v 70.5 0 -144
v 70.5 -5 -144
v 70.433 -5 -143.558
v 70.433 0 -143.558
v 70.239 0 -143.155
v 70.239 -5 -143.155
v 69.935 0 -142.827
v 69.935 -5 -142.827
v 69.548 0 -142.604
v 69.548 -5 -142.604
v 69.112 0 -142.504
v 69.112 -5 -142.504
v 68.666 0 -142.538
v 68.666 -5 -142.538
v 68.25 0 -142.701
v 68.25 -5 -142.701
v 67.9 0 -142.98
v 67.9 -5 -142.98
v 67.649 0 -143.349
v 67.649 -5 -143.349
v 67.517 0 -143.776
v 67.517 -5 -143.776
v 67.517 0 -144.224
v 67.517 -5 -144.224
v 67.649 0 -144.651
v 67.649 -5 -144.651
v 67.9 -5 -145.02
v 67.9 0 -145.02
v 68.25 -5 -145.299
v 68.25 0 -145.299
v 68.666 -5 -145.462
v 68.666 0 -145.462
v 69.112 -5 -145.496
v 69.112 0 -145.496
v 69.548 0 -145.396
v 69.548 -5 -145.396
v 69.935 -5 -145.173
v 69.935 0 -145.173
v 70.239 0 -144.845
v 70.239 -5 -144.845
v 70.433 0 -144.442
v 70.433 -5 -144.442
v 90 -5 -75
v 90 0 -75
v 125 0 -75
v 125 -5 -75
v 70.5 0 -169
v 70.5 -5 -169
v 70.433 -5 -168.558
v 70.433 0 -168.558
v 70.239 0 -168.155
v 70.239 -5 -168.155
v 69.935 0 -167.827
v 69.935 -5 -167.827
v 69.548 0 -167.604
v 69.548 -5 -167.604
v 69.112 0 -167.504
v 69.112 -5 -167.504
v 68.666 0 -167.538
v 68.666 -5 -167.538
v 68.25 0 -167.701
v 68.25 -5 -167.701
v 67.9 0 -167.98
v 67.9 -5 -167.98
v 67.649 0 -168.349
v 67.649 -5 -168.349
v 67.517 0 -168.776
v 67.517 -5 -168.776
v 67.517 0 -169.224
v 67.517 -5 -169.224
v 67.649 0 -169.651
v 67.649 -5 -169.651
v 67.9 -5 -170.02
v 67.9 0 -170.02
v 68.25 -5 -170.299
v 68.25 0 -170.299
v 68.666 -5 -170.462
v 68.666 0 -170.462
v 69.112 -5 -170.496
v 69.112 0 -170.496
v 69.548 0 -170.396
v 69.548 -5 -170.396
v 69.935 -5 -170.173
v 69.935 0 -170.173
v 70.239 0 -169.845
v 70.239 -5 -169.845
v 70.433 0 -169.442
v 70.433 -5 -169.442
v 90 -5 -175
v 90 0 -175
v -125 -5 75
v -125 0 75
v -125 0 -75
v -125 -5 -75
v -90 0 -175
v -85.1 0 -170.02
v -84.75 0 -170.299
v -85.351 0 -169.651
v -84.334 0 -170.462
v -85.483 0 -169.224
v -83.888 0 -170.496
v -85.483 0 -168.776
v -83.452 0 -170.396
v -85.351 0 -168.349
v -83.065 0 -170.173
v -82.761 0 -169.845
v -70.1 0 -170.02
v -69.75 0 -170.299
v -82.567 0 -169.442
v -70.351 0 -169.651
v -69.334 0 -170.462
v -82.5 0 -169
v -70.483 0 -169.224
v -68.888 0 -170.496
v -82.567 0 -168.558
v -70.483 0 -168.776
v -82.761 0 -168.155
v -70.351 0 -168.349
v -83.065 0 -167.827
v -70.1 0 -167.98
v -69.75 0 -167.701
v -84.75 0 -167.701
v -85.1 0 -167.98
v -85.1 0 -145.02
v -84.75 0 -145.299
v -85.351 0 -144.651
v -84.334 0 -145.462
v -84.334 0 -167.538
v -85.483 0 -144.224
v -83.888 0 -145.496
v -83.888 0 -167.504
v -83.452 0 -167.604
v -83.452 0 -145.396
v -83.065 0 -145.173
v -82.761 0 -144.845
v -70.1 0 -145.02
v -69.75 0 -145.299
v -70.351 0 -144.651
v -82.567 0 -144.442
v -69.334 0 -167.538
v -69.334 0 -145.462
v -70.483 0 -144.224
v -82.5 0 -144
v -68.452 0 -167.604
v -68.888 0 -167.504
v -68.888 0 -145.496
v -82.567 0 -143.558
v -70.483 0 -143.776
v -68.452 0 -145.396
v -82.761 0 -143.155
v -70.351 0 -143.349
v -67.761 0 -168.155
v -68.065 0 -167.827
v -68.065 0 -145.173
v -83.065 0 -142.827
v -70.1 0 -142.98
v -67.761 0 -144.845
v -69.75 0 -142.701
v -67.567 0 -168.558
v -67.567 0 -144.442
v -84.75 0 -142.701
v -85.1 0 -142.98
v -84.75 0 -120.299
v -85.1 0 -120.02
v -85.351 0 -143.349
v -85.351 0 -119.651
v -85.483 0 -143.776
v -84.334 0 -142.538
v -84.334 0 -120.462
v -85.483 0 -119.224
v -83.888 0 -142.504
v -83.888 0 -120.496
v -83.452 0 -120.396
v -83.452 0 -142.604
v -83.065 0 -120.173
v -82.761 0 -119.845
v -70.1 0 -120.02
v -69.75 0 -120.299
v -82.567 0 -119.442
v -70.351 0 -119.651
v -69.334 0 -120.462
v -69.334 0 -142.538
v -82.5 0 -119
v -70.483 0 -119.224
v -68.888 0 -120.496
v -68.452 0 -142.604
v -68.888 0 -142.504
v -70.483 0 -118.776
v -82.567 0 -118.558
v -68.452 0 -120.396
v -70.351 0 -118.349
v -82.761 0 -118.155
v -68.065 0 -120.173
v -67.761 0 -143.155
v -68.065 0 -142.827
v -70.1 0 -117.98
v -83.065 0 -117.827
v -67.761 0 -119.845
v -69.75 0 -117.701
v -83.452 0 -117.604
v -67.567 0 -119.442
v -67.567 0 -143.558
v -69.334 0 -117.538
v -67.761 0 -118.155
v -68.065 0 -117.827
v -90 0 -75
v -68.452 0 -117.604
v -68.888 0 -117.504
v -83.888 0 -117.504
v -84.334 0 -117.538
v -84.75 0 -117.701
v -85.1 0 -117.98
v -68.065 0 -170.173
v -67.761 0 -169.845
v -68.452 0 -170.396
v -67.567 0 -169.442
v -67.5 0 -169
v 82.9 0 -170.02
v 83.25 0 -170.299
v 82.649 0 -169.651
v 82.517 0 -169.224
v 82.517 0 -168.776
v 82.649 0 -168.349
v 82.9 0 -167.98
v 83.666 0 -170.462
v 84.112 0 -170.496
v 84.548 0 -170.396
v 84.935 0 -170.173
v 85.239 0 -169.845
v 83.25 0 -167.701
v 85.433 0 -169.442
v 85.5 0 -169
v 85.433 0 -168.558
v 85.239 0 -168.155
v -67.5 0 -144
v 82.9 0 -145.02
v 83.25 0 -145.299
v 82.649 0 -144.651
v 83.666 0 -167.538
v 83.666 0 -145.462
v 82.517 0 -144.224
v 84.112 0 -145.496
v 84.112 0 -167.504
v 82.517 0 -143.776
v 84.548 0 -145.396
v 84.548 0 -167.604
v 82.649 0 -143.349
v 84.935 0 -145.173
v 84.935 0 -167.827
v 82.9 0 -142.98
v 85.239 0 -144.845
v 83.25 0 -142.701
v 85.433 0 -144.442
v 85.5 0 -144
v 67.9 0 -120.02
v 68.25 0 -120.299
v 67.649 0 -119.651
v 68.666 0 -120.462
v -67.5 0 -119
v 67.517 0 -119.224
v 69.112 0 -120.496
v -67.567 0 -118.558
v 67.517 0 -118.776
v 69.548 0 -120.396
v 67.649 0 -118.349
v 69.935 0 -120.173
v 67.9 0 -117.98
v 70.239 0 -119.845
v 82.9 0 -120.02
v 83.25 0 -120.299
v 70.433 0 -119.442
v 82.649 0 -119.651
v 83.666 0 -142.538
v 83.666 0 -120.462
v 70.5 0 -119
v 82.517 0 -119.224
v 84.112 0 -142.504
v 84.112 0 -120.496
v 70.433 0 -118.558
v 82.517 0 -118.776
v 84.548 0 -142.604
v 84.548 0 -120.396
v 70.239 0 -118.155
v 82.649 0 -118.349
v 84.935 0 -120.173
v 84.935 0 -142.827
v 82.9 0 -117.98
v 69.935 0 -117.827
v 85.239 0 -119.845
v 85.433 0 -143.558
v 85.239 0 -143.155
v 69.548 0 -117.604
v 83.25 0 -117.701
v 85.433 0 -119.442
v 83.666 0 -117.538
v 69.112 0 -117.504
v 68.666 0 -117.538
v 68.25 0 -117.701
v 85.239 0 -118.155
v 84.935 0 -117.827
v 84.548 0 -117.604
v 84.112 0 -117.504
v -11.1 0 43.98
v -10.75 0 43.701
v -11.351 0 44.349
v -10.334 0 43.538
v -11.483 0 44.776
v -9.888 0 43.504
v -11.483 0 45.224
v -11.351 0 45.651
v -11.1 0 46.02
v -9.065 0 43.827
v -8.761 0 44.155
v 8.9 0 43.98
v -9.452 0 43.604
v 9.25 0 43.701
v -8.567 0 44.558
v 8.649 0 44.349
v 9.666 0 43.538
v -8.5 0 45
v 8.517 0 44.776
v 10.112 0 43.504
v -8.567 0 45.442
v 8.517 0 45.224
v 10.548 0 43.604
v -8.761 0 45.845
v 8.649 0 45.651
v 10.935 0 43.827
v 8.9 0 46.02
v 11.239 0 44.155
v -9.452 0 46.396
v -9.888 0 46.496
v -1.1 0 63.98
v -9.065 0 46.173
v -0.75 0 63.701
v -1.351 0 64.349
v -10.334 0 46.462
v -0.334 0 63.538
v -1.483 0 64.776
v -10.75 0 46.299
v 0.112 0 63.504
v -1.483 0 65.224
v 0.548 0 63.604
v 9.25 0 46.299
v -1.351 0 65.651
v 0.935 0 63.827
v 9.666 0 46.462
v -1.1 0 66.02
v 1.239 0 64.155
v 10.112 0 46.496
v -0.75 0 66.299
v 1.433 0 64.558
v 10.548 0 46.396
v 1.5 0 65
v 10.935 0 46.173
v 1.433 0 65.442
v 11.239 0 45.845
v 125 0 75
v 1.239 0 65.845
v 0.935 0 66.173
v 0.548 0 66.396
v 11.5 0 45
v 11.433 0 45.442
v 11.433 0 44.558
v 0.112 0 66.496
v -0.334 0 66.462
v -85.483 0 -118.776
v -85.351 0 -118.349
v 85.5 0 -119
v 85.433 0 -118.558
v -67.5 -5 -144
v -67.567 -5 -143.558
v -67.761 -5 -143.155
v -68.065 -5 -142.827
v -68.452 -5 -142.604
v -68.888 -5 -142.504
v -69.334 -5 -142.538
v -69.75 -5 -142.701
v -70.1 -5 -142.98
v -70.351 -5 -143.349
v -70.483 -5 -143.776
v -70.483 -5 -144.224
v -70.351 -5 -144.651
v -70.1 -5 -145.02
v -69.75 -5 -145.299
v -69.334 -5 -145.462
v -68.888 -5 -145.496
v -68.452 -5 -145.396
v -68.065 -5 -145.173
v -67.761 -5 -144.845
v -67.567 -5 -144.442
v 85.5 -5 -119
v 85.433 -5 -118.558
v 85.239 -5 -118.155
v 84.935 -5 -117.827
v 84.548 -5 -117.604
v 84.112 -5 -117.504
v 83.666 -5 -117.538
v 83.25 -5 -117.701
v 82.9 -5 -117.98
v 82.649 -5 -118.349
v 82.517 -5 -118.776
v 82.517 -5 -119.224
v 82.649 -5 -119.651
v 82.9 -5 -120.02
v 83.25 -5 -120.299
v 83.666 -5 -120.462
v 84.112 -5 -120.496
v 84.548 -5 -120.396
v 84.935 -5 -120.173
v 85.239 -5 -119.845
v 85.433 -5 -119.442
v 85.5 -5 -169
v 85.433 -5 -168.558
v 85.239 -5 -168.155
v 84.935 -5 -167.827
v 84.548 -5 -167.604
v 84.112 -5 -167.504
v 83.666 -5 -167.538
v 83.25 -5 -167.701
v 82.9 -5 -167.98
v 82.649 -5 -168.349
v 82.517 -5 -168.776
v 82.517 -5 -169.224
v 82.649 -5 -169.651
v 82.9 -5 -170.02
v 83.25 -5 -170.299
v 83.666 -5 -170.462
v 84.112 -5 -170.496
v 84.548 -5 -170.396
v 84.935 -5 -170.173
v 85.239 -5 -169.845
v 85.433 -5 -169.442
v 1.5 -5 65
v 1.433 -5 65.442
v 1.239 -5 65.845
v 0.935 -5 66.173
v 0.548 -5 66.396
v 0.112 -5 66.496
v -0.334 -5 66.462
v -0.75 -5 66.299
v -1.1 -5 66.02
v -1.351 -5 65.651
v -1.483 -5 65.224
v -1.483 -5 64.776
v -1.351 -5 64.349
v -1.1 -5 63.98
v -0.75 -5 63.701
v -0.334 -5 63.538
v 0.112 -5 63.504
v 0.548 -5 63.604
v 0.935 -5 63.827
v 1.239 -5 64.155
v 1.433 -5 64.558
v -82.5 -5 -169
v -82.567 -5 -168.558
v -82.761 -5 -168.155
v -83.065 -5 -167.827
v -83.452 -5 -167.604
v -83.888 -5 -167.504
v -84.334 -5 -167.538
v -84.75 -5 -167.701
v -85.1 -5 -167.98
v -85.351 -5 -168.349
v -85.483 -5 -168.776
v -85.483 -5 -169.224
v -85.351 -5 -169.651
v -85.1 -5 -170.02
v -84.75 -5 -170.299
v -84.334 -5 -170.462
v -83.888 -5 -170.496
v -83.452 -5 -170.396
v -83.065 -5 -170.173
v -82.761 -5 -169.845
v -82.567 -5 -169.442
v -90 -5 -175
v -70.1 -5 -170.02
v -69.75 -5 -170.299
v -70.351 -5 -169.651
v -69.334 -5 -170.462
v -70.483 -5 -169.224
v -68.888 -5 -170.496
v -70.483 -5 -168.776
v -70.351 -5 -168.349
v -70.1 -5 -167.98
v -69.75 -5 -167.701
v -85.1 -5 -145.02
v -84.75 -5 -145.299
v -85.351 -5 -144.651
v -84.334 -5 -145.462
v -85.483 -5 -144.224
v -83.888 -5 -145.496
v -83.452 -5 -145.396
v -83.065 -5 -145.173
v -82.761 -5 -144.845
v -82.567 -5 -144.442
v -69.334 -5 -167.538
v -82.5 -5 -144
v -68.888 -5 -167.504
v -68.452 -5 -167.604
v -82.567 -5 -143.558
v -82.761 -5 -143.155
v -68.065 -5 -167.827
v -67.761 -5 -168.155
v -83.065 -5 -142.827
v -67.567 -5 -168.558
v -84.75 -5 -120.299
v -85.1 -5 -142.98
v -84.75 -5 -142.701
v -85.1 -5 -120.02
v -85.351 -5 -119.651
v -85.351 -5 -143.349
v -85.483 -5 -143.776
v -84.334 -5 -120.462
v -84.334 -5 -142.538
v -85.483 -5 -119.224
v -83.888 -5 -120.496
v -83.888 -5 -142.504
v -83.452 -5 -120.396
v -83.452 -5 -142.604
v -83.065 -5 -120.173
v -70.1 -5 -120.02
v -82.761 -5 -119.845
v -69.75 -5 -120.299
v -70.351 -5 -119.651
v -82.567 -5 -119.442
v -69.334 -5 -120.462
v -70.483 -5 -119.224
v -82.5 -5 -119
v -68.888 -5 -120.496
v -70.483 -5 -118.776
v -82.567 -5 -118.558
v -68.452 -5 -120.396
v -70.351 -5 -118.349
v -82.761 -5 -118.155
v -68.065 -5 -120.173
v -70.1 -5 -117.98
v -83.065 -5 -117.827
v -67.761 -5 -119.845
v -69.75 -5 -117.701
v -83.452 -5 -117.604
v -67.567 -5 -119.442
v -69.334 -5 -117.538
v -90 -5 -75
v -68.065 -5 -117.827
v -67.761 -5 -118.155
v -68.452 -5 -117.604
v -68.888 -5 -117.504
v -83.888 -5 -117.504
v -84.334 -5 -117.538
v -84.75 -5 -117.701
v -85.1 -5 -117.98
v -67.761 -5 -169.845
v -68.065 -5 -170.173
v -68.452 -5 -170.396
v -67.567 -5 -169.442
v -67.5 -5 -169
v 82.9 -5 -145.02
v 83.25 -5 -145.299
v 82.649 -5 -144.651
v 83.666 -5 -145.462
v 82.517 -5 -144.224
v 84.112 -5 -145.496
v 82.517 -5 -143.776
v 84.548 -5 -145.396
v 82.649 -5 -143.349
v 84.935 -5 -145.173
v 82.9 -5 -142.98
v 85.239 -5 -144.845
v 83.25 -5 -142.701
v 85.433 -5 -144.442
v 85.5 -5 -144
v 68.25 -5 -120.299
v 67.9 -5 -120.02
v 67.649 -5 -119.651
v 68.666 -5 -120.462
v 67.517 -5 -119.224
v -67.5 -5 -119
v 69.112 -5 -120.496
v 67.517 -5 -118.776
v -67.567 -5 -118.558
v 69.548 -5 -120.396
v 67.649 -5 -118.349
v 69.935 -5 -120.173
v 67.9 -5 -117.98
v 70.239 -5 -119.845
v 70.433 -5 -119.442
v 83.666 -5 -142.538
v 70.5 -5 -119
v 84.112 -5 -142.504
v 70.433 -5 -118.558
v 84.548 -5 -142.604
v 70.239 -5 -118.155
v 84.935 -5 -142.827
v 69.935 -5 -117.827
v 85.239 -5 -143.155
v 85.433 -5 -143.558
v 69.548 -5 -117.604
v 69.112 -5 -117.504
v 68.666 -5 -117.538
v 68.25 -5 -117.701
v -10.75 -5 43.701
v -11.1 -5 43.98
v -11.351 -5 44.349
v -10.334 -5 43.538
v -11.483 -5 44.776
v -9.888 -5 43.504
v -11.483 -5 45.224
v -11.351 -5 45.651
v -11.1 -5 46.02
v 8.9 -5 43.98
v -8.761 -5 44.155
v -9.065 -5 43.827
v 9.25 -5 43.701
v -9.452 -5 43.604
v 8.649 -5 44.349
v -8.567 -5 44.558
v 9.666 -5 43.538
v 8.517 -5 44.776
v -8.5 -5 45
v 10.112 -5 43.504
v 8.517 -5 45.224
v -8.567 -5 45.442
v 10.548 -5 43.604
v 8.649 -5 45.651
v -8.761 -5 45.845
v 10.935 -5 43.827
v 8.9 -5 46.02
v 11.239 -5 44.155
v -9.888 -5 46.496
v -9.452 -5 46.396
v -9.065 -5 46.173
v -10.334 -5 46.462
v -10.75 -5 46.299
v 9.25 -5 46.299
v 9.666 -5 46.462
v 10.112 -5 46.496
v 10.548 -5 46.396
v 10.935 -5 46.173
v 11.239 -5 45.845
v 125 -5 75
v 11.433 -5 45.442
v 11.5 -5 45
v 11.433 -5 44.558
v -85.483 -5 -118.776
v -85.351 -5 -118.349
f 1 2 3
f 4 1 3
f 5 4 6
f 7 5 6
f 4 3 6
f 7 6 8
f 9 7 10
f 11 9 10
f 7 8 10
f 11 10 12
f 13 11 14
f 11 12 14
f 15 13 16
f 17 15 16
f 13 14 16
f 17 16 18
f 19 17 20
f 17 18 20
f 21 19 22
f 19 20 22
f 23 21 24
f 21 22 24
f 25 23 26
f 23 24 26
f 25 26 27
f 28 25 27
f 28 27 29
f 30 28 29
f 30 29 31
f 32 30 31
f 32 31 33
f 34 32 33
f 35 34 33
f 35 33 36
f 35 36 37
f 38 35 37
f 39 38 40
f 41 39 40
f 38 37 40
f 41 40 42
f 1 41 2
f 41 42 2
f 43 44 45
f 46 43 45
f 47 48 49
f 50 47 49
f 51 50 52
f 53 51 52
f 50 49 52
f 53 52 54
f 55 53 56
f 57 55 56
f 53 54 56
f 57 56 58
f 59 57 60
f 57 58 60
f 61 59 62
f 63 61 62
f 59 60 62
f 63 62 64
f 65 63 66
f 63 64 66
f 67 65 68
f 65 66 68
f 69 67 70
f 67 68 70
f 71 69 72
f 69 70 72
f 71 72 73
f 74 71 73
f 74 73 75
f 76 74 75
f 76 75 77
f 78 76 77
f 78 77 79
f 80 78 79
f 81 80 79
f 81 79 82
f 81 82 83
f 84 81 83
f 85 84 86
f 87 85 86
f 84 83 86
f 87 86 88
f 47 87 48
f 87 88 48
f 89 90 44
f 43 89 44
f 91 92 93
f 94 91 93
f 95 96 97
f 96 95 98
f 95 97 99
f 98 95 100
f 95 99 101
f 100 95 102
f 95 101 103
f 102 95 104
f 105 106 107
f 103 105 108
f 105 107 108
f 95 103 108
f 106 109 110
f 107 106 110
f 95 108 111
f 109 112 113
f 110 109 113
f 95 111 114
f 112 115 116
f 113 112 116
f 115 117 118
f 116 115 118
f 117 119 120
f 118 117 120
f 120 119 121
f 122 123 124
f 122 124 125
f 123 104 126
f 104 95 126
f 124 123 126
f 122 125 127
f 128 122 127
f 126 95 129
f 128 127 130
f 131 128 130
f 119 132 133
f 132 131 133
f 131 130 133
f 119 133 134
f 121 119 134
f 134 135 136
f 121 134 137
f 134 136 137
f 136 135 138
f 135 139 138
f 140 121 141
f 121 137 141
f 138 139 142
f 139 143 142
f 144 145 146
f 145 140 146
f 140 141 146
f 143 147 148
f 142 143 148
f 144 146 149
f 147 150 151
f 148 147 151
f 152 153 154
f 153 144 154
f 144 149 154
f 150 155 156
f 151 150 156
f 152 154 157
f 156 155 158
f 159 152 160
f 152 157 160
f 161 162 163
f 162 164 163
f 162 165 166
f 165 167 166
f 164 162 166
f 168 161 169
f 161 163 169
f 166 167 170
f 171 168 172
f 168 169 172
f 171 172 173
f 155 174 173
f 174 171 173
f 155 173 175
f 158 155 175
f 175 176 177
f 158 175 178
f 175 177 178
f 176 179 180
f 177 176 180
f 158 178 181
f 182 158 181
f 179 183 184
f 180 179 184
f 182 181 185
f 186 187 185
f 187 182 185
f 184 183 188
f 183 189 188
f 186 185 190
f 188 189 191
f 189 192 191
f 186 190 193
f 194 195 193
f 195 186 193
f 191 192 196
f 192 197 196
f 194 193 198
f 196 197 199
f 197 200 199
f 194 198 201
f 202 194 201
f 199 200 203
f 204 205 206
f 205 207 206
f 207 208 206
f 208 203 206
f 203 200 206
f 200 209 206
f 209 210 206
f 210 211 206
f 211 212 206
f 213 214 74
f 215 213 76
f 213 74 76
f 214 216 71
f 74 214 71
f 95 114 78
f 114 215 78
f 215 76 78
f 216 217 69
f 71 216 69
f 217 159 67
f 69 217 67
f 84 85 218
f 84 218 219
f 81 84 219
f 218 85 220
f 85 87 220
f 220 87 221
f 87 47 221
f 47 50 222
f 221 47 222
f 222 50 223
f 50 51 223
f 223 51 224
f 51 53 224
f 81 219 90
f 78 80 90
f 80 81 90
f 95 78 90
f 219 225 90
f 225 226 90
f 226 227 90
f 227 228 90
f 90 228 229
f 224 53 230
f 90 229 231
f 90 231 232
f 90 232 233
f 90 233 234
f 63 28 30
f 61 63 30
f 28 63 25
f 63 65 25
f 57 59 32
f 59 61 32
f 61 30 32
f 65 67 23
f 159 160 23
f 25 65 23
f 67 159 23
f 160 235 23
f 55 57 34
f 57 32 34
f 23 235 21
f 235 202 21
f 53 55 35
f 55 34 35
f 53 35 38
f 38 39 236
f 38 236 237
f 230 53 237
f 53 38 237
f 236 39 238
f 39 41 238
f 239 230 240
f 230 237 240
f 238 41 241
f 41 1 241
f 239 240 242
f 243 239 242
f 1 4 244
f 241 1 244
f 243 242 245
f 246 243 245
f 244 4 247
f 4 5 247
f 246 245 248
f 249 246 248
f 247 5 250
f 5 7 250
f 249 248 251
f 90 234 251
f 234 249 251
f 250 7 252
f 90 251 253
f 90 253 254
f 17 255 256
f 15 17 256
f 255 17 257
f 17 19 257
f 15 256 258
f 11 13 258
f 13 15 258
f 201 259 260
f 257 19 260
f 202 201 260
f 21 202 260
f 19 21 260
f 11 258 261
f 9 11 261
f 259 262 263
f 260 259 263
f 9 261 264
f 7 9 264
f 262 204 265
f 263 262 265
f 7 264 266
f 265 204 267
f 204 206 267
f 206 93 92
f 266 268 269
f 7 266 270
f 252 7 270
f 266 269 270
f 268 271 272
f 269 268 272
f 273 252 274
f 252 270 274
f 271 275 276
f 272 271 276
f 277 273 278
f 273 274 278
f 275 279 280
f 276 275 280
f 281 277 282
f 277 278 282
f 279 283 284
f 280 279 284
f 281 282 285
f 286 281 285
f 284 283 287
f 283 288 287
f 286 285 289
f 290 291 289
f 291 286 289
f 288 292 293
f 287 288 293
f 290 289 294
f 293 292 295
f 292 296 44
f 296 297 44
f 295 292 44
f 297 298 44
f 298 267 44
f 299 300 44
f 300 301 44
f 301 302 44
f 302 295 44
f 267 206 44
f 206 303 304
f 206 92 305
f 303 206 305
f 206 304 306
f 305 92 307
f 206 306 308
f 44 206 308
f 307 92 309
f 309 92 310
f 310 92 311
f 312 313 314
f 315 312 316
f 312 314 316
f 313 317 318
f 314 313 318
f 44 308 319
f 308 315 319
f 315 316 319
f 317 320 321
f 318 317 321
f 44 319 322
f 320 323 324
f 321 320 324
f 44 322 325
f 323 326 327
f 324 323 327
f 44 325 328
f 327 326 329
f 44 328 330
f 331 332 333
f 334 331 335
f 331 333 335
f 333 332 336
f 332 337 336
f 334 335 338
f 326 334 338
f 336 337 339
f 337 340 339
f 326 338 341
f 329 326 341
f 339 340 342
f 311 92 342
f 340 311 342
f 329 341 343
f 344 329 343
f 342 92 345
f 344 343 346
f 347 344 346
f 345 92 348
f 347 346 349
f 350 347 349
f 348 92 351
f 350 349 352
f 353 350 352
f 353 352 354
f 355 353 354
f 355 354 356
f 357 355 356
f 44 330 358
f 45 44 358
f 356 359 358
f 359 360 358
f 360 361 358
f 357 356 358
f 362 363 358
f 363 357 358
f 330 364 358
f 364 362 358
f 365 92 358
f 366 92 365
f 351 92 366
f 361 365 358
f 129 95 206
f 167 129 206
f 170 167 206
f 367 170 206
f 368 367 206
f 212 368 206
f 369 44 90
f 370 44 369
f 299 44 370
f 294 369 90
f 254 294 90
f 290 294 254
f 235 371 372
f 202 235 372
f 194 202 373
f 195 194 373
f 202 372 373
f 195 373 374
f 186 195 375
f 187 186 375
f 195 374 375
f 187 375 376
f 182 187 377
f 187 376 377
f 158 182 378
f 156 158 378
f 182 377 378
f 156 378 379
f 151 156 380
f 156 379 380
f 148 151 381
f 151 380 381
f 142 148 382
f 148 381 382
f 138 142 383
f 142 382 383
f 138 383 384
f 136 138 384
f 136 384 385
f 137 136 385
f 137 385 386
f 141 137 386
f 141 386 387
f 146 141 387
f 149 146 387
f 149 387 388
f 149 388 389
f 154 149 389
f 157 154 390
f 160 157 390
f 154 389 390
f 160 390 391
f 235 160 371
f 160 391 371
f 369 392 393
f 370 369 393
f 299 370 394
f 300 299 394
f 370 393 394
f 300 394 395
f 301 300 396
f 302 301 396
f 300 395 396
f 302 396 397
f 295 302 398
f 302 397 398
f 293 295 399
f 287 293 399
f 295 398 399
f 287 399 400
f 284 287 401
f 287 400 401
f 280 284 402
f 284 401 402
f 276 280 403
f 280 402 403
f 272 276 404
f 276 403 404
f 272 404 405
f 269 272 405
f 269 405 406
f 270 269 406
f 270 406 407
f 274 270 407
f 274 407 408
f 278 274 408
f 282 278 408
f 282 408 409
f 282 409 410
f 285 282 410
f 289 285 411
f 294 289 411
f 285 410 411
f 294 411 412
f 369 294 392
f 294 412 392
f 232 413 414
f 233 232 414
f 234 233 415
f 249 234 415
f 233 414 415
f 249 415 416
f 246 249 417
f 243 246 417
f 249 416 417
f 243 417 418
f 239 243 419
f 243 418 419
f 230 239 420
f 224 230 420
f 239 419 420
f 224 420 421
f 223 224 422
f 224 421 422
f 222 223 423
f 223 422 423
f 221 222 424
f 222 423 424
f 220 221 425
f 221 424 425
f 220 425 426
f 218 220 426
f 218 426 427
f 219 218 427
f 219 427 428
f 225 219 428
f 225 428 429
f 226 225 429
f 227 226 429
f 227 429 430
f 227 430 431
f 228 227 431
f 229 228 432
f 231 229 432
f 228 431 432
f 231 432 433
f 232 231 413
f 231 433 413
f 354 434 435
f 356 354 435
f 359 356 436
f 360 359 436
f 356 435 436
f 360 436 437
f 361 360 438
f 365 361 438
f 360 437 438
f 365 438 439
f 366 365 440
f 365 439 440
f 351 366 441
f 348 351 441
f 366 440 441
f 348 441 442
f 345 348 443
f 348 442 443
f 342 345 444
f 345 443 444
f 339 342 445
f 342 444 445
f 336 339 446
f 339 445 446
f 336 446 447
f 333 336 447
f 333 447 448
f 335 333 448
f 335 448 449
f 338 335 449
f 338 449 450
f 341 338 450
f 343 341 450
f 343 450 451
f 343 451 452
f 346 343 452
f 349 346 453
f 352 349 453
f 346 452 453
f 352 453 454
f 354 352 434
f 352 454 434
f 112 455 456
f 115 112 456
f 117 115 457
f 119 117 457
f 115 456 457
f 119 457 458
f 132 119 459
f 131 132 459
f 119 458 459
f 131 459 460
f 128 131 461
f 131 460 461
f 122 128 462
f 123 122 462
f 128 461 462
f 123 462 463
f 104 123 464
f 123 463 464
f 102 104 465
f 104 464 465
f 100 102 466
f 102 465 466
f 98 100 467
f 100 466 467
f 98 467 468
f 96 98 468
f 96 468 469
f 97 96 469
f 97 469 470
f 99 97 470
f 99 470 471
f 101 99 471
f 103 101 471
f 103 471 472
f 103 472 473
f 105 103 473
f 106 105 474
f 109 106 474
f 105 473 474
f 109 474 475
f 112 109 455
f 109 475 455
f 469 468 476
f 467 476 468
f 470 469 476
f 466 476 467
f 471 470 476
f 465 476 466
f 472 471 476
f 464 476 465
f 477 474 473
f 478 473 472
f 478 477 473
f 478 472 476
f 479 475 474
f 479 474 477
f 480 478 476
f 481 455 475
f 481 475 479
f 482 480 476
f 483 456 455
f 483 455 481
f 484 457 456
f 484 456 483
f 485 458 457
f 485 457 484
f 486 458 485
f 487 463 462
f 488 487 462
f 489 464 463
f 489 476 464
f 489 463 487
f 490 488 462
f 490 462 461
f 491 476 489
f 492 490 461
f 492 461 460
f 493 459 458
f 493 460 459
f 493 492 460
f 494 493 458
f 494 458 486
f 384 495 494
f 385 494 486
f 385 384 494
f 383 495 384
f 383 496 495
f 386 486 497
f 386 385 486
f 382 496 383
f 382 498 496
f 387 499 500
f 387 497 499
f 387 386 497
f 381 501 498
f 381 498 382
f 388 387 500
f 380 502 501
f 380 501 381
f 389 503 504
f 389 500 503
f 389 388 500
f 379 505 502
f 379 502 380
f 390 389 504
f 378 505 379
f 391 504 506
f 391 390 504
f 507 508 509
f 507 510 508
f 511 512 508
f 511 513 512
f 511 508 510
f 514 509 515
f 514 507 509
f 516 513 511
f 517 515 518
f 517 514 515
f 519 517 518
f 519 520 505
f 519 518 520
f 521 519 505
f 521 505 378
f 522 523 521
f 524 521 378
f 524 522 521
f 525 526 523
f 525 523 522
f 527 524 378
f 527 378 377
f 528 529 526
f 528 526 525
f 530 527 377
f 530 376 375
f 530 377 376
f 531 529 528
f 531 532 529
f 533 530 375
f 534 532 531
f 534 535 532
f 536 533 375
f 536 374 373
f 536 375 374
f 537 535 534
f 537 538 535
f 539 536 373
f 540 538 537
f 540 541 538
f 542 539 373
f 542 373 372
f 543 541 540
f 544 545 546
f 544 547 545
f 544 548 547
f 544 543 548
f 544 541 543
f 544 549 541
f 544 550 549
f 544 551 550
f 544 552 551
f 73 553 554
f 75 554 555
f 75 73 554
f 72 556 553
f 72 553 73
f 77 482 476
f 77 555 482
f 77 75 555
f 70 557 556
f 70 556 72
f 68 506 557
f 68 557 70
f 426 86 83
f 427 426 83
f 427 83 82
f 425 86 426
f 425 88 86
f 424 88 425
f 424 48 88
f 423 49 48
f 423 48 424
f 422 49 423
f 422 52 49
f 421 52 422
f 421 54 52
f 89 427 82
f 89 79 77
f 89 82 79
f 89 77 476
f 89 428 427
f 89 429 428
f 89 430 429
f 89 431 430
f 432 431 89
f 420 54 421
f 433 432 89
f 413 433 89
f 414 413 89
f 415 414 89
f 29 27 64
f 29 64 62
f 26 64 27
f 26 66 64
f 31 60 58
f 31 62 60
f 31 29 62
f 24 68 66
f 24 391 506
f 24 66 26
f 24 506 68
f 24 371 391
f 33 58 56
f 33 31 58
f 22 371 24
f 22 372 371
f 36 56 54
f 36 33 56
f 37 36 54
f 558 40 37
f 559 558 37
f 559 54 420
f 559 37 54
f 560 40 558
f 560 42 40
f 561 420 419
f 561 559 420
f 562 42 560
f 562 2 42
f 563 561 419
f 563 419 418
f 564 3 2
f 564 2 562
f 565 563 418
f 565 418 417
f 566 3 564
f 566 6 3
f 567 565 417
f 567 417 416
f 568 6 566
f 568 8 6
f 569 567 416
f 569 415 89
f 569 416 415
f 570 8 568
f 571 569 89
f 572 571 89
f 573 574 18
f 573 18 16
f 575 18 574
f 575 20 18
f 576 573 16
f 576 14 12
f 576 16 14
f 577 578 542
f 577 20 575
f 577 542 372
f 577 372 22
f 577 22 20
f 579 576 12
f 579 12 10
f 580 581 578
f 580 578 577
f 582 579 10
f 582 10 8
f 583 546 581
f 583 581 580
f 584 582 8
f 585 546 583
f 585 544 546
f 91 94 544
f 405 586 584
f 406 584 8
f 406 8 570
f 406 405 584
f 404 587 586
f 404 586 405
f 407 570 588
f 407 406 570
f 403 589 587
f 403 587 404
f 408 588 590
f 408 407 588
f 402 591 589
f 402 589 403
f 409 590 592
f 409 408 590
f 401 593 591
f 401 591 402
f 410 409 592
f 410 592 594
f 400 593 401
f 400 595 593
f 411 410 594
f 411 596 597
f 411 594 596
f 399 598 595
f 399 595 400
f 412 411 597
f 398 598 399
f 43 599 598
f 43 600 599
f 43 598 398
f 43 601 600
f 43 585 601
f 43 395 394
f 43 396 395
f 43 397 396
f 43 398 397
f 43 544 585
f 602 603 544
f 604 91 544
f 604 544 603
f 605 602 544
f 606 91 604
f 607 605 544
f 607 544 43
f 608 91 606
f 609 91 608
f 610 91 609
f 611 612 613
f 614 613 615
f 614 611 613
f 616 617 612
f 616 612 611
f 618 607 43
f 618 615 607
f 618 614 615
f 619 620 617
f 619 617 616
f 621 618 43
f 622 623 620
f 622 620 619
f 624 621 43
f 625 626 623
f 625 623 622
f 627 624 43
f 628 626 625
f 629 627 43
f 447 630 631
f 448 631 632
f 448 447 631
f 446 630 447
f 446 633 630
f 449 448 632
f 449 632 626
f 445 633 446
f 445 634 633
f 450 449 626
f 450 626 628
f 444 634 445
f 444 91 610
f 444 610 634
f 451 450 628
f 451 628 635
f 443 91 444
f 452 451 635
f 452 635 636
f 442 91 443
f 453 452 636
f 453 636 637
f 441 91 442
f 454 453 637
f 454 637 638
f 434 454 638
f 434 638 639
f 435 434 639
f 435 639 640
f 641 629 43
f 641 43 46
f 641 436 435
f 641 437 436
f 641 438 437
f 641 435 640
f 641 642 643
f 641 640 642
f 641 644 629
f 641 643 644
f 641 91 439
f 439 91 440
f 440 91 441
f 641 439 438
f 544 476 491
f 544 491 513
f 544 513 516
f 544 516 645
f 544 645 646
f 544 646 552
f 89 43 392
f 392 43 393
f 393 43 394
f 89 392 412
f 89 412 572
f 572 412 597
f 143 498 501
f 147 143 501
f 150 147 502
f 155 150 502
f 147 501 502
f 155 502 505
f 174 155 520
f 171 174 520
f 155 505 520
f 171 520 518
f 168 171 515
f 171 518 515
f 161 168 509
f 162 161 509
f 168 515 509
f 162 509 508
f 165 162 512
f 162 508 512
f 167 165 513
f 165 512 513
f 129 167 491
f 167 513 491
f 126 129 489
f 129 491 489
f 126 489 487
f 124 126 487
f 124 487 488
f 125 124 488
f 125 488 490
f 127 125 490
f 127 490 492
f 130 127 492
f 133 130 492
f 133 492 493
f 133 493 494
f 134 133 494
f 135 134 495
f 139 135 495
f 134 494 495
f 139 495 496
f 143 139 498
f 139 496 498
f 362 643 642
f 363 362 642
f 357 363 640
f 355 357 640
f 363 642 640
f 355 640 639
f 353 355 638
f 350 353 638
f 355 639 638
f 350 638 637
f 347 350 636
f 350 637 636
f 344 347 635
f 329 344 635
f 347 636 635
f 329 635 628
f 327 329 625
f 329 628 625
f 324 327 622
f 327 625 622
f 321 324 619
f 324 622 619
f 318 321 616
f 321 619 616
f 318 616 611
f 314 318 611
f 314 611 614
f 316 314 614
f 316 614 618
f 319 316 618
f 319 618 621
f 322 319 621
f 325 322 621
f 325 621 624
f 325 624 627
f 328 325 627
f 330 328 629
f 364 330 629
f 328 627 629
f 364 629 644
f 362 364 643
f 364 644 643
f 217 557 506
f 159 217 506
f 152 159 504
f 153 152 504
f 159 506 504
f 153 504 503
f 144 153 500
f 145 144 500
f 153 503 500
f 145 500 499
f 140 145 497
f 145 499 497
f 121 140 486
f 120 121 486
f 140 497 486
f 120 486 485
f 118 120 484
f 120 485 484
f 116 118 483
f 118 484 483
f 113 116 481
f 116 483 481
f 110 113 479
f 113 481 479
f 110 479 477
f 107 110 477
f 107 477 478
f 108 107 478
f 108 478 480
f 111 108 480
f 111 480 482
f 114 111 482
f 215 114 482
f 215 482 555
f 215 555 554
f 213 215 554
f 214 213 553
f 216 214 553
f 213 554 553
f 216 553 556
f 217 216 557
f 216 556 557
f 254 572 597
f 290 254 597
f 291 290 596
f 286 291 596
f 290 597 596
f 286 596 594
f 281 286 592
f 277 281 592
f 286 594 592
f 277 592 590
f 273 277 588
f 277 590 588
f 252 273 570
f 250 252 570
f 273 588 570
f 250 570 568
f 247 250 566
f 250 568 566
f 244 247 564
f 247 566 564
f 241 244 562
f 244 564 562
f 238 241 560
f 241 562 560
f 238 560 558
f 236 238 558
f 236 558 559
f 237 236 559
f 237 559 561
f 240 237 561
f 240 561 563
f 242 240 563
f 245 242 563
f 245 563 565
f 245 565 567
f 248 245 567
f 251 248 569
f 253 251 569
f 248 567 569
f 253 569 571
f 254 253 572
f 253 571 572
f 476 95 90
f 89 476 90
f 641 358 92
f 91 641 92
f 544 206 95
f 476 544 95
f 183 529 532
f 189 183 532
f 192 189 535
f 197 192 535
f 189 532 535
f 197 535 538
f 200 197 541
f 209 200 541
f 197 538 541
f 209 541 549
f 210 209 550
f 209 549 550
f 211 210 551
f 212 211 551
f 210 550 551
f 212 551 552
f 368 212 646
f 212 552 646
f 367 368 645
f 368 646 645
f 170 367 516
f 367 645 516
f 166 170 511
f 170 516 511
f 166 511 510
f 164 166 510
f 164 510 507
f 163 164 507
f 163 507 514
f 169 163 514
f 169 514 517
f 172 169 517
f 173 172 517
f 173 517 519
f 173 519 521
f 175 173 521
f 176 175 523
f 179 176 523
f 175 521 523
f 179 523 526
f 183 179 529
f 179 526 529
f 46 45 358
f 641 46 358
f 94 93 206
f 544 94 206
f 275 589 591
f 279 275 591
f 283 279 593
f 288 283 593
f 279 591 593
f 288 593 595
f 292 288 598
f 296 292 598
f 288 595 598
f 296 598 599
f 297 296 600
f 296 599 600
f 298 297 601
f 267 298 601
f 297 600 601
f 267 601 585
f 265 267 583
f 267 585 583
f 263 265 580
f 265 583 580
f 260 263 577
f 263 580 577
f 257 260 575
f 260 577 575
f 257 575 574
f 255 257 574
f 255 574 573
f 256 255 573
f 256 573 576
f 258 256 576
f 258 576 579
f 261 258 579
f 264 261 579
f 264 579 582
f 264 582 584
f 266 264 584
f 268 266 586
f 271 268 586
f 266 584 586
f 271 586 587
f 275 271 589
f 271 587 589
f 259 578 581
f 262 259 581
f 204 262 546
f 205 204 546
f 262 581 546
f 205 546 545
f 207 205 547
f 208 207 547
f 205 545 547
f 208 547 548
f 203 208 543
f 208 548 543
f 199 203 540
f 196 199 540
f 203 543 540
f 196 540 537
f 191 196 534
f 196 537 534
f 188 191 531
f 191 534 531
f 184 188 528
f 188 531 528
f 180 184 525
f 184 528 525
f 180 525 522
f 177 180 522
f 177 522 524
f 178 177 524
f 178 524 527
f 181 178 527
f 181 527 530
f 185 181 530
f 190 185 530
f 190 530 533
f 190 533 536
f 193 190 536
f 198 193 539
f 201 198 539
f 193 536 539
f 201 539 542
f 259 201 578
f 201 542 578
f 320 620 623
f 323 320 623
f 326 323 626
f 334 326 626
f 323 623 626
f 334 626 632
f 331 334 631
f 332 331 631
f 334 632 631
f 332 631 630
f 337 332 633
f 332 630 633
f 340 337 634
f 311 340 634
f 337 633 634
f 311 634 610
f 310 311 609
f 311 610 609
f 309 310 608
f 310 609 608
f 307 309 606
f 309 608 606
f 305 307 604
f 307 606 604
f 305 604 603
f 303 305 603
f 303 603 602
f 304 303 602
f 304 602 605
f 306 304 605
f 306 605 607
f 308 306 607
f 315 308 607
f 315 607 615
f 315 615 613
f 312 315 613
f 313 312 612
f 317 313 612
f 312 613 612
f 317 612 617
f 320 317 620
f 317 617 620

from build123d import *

# Parameters (mm, degrees)
F1_DEPTH = 5
F2_R     = 1.5
F3_DEPTH = 5


with BuildPart() as f1:
    # F0 (on Front) → F1 (new body)
    with BuildSketch(Plane.XZ):
        Polygon((90, -75), (125, -75), (125, 75), (-125, 75), (-125, -75), (-90, -75), (-90, -175), (90, -175), align=None)
    extrude(amount=F1_DEPTH)

    # F2 (on face) → F3 (cut)
    with BuildSketch(Plane.XZ.offset(5)):
        with Locations((0, 65)):
            Circle(F2_R)
        with Locations((-10, 45)):
            Circle(F2_R)
        with Locations((10, 45)):
            Circle(F2_R)
        with Locations((-84, -169)):
            Circle(F2_R)
        with Locations((-84, -144)):
            Circle(F2_R)
        with Locations((-84, -119)):
            Circle(F2_R)
        with Locations((-69, -169)):
            Circle(F2_R)
        with Locations((-69, -144)):
            Circle(F2_R)
        with Locations((-69, -119)):
            Circle(F2_R)
        with Locations((84, -169)):
            Circle(F2_R)
        with Locations((84, -144)):
            Circle(F2_R)
        with Locations((69, -169)):
            Circle(F2_R)
        with Locations((69, -119)):
            Circle(F2_R)
        with Locations((69, -144)):
            Circle(F2_R)
        with Locations((84, -119)):
            Circle(F2_R)
    extrude(amount=-F3_DEPTH, mode=Mode.SUBTRACT)


solid = f1.part
